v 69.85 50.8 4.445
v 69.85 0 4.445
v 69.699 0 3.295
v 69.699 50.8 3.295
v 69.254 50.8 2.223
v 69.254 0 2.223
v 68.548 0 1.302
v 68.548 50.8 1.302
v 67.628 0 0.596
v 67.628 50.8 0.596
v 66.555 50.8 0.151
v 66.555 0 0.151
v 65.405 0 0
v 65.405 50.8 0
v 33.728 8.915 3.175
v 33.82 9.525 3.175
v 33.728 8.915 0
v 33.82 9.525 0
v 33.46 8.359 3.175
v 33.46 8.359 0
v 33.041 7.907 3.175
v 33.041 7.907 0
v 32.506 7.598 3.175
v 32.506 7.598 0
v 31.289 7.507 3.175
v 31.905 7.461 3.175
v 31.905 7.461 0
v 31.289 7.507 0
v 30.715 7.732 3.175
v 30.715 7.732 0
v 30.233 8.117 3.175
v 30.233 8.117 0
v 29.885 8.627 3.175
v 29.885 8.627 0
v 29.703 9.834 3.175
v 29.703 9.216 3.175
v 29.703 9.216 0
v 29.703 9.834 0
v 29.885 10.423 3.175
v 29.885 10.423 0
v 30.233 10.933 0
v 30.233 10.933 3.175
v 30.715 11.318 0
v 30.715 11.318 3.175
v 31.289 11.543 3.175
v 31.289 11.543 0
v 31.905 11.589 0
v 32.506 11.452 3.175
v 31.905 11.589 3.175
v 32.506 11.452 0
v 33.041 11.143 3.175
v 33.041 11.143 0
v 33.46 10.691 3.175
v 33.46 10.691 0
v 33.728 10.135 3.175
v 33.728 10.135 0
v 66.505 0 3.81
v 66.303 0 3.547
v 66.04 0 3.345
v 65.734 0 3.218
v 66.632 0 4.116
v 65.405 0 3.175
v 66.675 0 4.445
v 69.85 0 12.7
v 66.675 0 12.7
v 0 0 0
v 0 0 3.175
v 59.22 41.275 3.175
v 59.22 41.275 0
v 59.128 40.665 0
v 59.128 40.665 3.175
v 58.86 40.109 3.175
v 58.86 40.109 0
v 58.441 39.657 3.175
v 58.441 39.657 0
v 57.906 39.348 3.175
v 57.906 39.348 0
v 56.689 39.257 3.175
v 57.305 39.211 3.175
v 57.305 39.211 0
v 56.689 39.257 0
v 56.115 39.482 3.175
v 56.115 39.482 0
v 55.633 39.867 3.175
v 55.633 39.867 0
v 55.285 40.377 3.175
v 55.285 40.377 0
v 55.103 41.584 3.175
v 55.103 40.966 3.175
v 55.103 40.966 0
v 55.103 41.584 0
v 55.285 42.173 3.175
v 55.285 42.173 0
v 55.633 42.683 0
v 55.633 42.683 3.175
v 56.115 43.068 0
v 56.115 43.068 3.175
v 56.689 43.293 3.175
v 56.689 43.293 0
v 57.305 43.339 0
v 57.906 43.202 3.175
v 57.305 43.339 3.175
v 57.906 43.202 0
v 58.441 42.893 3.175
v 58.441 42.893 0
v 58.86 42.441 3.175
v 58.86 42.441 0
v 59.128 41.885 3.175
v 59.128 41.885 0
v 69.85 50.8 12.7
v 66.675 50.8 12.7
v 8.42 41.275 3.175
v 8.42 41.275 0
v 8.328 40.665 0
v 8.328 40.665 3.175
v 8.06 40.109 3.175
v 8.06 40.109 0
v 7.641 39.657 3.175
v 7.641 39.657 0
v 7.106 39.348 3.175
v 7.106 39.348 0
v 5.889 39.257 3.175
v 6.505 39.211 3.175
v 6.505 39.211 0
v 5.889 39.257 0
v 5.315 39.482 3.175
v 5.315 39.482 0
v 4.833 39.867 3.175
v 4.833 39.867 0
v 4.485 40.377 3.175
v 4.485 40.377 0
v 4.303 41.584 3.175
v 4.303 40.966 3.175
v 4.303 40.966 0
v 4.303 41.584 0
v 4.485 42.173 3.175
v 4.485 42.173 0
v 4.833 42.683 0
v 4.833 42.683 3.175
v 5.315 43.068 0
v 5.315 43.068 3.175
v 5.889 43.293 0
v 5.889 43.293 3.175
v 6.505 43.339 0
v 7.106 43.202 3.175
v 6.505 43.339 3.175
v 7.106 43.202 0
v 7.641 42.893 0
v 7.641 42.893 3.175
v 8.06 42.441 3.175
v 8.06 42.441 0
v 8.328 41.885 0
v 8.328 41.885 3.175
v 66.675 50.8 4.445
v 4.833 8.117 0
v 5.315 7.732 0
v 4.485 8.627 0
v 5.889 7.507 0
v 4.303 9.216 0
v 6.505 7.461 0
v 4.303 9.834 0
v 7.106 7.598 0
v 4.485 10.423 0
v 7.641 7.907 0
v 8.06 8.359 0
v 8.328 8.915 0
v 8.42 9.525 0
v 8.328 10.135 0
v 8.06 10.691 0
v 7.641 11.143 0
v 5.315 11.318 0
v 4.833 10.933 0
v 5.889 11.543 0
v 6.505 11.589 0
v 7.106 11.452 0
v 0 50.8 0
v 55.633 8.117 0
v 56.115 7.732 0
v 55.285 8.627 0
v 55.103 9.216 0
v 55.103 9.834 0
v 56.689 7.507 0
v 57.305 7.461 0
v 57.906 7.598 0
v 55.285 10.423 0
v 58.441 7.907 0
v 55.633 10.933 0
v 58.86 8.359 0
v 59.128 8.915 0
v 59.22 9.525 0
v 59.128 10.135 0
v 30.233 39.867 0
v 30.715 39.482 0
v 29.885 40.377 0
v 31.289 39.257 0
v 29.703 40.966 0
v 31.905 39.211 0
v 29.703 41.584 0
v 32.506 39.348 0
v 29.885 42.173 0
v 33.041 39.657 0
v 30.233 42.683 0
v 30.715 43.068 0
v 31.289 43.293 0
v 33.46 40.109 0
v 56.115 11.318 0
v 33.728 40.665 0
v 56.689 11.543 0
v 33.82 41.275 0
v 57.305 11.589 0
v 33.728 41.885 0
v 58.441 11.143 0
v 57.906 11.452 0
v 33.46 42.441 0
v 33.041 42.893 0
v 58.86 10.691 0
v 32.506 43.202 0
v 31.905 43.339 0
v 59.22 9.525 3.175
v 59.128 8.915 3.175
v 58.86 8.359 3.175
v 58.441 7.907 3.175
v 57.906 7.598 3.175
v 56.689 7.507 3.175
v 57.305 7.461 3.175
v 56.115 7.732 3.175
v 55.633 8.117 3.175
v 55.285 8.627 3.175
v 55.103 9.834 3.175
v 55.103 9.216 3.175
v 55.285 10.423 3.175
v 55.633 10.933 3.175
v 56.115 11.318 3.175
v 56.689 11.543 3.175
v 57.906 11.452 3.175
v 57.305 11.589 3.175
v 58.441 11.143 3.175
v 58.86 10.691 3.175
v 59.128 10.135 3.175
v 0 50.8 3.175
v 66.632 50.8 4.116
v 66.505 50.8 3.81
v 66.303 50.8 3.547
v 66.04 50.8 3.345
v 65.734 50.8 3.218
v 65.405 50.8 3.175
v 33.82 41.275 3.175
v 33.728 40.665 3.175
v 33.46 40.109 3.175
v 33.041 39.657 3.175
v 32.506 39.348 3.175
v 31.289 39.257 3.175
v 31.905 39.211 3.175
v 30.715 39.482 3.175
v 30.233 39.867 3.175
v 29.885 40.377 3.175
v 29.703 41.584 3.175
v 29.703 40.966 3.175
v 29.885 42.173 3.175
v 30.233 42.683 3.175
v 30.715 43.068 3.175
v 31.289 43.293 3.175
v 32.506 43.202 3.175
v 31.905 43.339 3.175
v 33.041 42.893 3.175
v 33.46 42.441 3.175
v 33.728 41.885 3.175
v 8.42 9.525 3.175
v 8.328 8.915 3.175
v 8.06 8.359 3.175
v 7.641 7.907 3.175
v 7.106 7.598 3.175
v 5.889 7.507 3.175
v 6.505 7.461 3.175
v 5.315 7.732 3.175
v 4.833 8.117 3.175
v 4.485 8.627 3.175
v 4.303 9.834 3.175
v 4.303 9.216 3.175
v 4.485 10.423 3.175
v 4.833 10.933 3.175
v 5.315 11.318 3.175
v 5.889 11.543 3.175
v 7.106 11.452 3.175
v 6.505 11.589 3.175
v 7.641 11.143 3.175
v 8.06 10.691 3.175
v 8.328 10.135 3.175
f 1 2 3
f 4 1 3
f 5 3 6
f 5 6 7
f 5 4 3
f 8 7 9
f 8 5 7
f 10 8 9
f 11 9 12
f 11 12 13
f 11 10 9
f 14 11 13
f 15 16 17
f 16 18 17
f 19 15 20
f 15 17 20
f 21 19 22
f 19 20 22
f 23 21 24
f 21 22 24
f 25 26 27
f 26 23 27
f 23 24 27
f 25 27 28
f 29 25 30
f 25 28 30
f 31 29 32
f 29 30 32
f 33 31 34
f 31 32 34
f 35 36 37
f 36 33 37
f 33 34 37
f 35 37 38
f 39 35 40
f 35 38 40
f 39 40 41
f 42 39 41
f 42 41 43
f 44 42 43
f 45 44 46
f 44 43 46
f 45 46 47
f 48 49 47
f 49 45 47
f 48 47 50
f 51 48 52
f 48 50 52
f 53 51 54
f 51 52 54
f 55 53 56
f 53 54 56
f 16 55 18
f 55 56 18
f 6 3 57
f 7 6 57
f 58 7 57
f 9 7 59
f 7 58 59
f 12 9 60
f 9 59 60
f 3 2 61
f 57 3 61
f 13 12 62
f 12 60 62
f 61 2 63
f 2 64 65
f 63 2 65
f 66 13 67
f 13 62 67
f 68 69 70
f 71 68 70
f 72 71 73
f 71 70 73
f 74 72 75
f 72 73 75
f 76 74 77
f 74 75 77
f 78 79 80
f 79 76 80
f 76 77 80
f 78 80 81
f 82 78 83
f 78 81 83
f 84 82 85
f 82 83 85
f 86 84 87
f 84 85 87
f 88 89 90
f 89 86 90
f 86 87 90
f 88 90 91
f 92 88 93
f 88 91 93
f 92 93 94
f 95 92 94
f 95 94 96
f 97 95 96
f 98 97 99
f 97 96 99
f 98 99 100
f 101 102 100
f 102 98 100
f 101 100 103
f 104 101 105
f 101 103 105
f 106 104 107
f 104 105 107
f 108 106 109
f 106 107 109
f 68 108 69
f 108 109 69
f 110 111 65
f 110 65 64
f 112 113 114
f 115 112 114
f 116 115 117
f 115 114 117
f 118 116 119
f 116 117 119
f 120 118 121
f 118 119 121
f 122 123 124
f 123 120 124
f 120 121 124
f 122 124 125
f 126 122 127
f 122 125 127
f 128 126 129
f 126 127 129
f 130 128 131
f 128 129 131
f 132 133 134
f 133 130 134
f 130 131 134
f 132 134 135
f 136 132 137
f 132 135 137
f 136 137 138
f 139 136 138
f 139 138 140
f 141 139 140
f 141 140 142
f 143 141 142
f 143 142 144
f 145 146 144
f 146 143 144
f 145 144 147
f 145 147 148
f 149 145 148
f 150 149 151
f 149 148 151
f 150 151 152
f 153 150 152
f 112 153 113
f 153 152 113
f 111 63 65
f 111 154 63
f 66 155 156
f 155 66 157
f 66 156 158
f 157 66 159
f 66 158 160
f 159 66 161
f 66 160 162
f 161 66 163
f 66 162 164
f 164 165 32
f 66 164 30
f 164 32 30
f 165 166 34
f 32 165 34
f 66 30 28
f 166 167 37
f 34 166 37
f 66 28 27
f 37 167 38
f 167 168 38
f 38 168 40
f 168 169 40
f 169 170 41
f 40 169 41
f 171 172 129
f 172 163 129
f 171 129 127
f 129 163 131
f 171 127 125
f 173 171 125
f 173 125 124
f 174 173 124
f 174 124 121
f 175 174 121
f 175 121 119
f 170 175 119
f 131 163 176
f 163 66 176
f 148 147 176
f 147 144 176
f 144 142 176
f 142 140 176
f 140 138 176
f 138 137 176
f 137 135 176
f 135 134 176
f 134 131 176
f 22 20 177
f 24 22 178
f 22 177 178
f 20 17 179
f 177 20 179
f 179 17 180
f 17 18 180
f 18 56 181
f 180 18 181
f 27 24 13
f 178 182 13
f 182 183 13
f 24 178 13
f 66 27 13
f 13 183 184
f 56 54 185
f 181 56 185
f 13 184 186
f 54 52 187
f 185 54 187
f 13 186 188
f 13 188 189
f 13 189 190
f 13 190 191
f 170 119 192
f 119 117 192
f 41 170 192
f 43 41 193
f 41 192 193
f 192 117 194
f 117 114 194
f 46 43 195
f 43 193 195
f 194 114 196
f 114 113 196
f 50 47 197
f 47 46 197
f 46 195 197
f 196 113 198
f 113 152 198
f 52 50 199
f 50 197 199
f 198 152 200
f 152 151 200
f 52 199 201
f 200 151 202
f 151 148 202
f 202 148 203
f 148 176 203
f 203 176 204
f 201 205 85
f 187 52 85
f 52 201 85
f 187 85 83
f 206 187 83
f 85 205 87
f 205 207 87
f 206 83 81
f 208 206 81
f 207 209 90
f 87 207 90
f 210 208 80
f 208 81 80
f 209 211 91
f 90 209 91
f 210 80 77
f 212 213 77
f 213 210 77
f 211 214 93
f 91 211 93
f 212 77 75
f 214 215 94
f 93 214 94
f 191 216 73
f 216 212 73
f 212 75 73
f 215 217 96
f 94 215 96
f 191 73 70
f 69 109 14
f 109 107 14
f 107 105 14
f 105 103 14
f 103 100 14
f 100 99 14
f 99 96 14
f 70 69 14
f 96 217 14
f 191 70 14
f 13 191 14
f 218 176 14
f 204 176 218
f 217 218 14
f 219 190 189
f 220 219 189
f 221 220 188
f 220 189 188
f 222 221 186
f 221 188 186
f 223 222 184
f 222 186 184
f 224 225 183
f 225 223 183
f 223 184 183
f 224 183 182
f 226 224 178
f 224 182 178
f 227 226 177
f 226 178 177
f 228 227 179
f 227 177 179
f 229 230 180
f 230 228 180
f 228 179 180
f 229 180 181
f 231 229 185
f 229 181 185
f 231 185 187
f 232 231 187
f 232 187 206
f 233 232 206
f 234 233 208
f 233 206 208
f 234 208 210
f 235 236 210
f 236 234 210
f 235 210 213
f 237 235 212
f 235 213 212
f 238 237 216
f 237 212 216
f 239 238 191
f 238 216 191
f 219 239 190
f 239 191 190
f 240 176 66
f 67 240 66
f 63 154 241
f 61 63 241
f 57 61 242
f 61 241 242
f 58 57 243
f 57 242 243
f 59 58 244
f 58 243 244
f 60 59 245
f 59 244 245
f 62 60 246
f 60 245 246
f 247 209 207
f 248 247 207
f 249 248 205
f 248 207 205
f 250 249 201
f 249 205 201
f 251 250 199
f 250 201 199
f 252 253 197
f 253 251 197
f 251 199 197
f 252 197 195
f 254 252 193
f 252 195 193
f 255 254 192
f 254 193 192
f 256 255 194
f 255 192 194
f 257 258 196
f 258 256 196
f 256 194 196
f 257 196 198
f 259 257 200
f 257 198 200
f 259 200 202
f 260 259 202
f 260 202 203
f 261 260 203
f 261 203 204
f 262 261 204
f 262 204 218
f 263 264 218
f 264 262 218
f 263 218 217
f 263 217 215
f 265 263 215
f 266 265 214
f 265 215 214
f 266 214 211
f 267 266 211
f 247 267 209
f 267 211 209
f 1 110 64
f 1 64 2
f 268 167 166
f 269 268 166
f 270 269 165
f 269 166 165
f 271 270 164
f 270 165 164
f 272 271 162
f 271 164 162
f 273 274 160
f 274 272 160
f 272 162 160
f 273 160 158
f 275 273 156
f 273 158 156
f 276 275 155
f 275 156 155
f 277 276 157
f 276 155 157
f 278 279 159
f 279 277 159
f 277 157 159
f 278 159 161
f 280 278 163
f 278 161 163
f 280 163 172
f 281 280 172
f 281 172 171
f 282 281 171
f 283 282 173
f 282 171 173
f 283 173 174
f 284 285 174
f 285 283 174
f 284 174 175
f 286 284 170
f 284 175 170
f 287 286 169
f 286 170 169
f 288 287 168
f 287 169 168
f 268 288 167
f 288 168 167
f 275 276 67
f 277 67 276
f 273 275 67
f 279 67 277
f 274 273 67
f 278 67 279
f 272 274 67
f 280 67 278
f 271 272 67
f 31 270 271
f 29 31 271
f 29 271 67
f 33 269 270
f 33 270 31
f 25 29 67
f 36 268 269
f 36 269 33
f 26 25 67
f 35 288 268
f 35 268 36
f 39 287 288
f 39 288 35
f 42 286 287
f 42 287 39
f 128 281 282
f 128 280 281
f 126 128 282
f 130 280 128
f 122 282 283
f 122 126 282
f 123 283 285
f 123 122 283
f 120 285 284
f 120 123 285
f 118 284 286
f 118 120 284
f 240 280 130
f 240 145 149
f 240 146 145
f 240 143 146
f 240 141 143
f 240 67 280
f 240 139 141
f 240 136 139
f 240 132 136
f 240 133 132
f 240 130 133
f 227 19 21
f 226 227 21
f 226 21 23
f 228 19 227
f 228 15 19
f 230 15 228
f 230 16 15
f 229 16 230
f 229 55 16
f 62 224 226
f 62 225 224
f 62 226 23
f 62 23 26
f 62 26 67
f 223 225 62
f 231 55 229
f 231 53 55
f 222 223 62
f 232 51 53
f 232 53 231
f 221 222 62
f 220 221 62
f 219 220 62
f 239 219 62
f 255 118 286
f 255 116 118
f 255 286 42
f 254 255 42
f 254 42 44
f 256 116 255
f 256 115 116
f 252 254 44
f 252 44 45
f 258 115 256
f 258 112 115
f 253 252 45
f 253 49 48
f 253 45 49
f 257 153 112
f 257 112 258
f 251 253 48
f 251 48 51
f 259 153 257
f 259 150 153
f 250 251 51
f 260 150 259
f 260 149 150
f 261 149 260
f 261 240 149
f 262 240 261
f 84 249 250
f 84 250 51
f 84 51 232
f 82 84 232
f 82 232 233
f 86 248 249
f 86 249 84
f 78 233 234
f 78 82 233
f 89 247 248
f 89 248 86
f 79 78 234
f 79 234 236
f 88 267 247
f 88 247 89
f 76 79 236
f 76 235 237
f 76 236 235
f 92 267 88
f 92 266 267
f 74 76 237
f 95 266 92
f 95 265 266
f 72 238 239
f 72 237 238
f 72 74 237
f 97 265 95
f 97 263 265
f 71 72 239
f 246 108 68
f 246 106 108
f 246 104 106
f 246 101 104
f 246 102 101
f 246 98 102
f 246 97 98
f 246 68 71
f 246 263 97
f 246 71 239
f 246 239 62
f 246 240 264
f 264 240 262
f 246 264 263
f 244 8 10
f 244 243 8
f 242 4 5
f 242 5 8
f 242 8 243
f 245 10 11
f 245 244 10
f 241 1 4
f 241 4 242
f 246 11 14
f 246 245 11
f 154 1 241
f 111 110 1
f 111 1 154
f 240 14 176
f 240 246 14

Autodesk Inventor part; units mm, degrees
ref_plane "YZ Plane" through (0, 0, 0) normal (1, 0, 0) x (0, 1, 0)
ref_plane "XZ Plane" through (0, 0, 0) normal (0, 1, 0) x (-1, 0, 0)
ref_plane "XY Plane" through (0, 0, 0) normal (0, 0, 1) x (1, 0, 0)
sketch "Sketch1" plane through (0, 0, 0) normal (0, 0, 1) x (1, 0, 0)
  line L0 (0, 0) -> (69.85, 0)
  line L1 (69.85, 0) -> (69.85, 50.8)
  line L2 (69.85, 50.8) -> (0, 50.8)
  line L3 (0, 50.8) -> (0, 0)
  circle A0 centre (6.35, 9.525) radius 2.0701
  circle A1 centre (31.75, 9.525) radius 2.0701
  circle A2 centre (57.15, 9.525) radius 2.0701
  circle A3 centre (6.35, 41.275) radius 2.0701
  circle A4 centre (31.75, 41.275) radius 2.0701
  circle A5 centre (57.15, 41.275) radius 2.0701
  dimension "d4" = 50.8
  dimension "d5" = 69.85
  dimension "d6" = 4.1402
  dimension "d7" = 6.35
  dimension "d8" = 9.525
  dimension "d9" = 25.4
  dimension "d10" = 31.75
extrude "Plate1" add sketch "Sketch1" along normal blind 3.175
sketch "Sketch2" plane through (66.675, 50.8, 0) normal (1, 0, 0) x (0, 1, 0)
  line L0 (-50.8, 0) -> (0, 0)
  line L1 (0, 0) -> (0, 12.7)
  line L2 (0, 12.7) -> (-50.8, 12.7)
  line L3 (-50.8, 12.7) -> (-50.8, 0)
edge flange "Flange1" height 12.7 angle 90 thickness 3.175 bend radius 1.27 thickness toward (1, 0, 0) relief tear relief width 3.175 relief depth 1.5875 edges at (69.85, 25.4, 3.175) wall of the first edge with corners at (66.675, 0, 0) (66.675, 50.8, 0) (66.675, 50.8, 12.7) (66.675, 0, 12.7)
bend "Bend1"
corner "Corner1"
equation "\"d12\" = BendReliefWidth"
equation "\"d13\" = BendReliefDepth"
equation "\"d14\" = MinimumRemnant"
equation "\"d15\" = BendRadius"
equation "\"d19\" = CornerReliefSize"
equation "\"d20\" = GapSize"
equation "\"d21\" = JacobiRadiusSize"
equation "\"BendRadius\" = Thickness"
equation "\"BendReliefWidth\" = Thickness"
equation "\"BendReliefDepth\" = 0.5 * Thickness"
equation "\"CornerReliefSize\" = 4 * Thickness"
equation "\"MinimumRemnant\" = 2 * Thickness"
equation "\"TransitionRadius\" = BendRadius"
equation "\"JacobiRadiusSize\" = BendRadius"
equation "\"GapSize\" = Thickness"
equation "\"d11\" = BendRadius"
equation "\"Thickness\" = 3.175"
properties part number "Spacer 3" material "Aluminum 6061"
